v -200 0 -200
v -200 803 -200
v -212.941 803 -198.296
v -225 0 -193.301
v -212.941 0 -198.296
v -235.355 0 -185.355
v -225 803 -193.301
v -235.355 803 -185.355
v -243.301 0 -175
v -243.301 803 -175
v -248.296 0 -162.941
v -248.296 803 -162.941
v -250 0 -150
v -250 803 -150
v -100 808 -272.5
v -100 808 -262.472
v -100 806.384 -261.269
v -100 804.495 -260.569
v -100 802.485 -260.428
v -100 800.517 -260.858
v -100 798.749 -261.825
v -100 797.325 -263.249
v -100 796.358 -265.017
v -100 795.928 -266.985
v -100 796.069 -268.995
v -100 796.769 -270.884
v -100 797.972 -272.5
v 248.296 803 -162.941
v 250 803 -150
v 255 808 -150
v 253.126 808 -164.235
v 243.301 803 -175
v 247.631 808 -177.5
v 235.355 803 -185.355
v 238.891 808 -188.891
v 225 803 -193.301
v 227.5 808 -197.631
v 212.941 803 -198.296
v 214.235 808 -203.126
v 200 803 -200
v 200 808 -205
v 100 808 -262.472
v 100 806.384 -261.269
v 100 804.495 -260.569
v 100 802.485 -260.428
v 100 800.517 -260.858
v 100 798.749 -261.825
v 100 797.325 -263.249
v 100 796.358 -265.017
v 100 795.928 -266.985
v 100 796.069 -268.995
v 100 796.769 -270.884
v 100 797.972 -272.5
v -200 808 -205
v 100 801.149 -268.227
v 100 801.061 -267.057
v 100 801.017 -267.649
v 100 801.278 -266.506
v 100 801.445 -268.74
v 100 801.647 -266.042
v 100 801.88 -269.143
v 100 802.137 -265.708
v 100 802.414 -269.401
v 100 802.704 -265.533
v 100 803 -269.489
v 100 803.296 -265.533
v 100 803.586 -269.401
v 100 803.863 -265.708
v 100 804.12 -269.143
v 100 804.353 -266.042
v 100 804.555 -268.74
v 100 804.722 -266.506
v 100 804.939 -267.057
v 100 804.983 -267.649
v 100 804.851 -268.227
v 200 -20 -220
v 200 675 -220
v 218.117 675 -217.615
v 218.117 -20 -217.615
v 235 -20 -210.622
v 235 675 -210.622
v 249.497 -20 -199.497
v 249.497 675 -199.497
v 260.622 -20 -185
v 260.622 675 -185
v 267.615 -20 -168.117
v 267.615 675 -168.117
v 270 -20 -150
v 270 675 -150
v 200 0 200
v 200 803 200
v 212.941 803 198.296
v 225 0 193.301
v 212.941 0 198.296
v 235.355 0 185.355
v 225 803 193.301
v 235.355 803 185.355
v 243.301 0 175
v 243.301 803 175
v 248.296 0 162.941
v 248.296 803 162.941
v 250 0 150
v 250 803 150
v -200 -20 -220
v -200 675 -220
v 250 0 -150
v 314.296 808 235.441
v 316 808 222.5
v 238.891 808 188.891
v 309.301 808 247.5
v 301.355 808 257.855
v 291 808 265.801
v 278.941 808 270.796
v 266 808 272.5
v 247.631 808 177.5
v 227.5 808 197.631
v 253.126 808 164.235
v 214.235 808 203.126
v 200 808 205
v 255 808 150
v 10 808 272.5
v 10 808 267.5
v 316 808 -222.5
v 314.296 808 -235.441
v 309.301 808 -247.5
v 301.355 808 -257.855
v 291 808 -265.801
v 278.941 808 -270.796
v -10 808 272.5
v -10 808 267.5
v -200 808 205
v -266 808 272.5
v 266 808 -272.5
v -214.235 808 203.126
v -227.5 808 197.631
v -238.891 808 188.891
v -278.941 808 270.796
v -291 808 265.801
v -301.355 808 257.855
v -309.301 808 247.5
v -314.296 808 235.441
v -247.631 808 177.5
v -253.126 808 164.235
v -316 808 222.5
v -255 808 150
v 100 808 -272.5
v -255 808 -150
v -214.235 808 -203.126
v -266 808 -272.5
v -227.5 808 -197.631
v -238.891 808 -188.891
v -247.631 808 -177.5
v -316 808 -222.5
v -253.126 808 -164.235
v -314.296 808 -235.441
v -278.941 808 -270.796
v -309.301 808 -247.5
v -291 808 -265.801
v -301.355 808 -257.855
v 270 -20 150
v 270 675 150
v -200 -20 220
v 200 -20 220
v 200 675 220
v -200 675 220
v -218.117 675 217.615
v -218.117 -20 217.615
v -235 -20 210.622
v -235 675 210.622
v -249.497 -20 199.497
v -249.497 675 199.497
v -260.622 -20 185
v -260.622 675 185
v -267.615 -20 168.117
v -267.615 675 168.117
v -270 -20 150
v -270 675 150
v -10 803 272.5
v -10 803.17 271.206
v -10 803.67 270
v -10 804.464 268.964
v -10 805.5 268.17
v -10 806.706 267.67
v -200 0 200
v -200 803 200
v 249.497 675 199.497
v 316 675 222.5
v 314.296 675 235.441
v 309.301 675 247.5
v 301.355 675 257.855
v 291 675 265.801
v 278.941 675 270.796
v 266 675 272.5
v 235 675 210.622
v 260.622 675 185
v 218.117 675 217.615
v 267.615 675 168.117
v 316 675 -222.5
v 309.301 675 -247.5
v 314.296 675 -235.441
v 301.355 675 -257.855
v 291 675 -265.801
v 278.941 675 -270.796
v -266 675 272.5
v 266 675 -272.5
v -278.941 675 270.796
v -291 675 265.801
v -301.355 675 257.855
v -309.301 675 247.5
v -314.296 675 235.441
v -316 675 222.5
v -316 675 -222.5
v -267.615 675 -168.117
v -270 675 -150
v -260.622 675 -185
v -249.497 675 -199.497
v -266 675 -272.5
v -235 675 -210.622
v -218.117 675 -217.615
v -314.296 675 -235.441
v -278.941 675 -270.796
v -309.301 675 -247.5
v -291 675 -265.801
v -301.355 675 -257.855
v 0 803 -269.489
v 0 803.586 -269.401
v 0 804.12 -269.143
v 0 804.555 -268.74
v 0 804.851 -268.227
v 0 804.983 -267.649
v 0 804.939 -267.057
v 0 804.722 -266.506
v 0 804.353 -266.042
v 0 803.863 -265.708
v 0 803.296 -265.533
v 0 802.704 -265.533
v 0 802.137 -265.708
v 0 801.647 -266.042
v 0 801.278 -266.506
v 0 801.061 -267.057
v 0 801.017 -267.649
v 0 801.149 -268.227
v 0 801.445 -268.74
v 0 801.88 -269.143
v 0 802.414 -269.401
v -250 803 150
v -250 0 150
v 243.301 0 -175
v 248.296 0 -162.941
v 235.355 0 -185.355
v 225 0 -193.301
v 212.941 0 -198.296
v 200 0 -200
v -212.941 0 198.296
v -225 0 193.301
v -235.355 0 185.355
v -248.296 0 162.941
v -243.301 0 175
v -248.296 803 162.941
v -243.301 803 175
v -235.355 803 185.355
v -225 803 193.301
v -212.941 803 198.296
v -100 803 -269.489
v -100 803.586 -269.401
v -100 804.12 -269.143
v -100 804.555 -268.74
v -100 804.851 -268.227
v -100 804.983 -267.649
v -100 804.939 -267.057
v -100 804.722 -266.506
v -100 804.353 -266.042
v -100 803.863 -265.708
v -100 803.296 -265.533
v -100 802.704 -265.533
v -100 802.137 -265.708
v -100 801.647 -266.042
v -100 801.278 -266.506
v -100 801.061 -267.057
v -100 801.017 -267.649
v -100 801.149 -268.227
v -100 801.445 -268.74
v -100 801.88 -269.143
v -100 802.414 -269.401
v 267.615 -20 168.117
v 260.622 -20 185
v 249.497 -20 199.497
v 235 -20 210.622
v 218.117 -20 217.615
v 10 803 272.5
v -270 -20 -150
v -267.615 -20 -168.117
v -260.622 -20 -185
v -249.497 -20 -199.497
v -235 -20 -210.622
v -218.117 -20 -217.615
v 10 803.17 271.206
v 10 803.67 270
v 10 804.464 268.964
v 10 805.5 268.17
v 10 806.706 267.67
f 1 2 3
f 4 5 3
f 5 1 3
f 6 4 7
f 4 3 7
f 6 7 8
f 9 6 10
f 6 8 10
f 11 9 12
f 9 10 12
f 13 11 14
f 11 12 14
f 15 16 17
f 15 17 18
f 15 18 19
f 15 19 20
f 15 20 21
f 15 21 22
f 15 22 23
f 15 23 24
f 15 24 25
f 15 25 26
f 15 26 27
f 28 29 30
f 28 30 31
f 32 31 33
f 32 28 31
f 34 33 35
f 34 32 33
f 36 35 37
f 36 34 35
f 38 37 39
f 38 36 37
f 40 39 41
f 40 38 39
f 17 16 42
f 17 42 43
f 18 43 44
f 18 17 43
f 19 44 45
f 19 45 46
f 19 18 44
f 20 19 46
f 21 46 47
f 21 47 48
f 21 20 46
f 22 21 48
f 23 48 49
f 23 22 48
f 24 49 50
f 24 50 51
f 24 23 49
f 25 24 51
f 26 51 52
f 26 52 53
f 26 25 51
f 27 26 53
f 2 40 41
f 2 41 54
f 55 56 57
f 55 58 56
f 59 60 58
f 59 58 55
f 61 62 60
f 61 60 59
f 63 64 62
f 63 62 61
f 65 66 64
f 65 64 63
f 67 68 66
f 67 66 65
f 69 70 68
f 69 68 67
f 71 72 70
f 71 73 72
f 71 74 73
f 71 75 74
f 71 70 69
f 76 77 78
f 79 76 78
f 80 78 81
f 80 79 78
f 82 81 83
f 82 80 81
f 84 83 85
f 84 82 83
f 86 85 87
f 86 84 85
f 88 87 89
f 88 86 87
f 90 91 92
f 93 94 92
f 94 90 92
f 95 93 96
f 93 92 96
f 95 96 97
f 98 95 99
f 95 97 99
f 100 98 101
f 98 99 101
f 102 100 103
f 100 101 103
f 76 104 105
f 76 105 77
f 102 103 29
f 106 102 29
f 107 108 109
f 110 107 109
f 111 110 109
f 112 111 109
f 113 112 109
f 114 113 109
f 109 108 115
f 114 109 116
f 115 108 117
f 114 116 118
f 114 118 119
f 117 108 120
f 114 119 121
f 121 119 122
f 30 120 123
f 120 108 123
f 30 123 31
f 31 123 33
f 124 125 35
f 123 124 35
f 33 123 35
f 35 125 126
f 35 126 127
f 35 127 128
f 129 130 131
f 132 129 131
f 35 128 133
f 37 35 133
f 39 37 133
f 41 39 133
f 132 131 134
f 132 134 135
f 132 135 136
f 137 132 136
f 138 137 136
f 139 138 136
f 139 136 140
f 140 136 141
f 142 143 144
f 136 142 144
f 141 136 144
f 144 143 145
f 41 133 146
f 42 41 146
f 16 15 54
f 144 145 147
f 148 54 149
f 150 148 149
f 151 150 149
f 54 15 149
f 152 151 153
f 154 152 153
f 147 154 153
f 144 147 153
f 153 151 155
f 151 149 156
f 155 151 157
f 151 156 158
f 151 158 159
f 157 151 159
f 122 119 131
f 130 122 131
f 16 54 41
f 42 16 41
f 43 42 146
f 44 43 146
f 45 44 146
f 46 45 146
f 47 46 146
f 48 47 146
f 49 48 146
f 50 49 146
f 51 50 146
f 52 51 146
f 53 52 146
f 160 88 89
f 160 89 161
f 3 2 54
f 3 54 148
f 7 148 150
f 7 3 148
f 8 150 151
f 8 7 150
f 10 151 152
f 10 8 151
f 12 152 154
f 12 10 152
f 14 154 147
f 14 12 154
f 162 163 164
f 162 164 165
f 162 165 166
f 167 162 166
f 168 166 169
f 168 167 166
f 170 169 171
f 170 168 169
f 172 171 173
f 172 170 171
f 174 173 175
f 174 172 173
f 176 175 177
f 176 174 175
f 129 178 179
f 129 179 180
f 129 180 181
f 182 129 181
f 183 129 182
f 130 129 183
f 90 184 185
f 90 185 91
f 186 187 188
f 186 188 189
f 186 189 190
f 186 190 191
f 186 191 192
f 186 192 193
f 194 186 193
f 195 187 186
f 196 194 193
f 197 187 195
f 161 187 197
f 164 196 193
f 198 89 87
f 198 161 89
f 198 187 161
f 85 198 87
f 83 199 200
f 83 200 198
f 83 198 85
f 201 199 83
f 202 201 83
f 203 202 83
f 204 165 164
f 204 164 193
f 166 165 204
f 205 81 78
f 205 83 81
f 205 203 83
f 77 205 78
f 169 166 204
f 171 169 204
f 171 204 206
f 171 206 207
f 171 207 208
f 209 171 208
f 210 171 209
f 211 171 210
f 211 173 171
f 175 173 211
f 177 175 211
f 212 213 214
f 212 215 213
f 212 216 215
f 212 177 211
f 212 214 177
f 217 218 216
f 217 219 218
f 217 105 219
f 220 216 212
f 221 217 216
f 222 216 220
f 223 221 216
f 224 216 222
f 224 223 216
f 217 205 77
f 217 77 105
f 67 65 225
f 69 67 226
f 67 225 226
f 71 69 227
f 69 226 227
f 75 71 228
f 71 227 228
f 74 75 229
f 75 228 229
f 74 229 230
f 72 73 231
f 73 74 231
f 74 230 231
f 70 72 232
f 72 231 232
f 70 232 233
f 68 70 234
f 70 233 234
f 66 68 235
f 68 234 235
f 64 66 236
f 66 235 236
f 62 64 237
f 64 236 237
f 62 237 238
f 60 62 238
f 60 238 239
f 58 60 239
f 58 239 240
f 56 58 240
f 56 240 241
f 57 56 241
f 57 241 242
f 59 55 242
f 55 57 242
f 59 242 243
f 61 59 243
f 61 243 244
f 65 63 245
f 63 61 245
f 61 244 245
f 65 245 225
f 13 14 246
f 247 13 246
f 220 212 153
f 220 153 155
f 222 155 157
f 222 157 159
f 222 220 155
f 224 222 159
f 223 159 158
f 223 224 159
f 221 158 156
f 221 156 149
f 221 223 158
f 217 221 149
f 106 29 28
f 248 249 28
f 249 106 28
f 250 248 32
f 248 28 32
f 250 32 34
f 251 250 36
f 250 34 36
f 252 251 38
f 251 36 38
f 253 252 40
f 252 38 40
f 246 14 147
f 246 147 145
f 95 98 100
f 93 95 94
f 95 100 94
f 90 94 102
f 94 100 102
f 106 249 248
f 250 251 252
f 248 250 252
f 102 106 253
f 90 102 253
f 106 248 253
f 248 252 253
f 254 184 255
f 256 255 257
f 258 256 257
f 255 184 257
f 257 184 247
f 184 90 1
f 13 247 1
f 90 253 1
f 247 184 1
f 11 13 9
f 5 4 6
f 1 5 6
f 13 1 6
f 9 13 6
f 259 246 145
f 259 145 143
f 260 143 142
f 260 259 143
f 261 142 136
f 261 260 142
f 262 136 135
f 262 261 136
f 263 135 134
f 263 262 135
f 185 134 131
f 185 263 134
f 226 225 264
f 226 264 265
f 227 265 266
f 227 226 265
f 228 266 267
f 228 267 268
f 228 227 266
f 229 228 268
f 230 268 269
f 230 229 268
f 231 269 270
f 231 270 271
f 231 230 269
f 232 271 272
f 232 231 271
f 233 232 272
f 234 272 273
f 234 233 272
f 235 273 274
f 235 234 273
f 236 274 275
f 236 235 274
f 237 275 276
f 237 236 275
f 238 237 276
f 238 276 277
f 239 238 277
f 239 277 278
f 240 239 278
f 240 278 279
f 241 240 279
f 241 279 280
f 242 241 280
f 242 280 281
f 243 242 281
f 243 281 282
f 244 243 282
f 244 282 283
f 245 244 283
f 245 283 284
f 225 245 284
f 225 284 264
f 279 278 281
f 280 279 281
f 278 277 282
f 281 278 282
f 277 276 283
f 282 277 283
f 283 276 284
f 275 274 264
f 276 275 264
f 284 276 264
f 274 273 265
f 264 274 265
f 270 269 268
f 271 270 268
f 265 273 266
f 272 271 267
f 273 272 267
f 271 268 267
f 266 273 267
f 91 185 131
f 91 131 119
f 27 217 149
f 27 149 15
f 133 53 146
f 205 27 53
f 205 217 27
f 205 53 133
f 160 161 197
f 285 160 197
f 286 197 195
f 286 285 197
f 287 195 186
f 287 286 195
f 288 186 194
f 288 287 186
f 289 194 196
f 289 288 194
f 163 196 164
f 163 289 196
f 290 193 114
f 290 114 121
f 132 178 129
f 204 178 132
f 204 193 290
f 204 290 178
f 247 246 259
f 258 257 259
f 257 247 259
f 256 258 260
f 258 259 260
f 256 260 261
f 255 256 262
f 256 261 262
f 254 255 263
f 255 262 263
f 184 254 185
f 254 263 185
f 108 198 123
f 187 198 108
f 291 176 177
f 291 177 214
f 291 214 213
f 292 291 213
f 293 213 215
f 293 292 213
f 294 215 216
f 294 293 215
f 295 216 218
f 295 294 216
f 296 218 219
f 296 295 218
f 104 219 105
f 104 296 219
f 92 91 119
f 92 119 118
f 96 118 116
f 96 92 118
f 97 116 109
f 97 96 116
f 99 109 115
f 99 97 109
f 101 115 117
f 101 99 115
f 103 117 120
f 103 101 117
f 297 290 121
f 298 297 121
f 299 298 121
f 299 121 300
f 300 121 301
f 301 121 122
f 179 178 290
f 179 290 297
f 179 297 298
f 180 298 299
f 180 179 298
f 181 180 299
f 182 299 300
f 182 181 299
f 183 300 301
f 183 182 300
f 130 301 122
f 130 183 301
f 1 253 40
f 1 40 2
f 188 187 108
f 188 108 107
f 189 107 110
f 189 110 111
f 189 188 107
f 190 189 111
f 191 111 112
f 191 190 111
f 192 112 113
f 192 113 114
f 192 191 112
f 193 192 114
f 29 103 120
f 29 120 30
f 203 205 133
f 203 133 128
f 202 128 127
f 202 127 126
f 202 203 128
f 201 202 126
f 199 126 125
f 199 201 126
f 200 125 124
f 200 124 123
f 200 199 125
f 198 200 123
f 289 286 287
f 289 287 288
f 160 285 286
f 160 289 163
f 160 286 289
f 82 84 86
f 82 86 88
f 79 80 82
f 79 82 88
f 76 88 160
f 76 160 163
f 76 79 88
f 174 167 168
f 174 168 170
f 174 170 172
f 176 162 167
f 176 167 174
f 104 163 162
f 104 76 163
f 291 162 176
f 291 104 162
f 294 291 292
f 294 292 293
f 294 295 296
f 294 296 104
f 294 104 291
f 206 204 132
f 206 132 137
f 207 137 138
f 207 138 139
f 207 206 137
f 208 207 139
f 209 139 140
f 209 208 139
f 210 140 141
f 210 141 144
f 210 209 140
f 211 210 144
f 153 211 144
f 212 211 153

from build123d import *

# Parameters (mm, degrees)
BOSS_EXTRUDE1_DEPTH             = 800
SHELL1_T                        = 20
FILLET1_R                       = 10
SKETCH2_W                       = 30
SKETCH2_H                       = 40.435969651
SKETCH2_W_2                     = 30.005971622
BOSS_EXTRUDE2_DEPTH             = 50
SKETCH3_R                       = 10
CUT_EXTRUDE1_DEPTH              = 91
SKETCH4_W                       = 55.917258457
SKETCH4_H                       = 29.702669957
BOSS_EXTRUDE3_DEPTH             = 46
SKETCH5_R                       = 7.963396182
SKETCH5_R_2                     = 2.238128569
BOSS_EXTRUDE4_DEPTH             = 105
CHAMFER1_SIZE                   = 5
BOSS_EXTRUDE5_DEPTH             = 8
BOSS_EXTRUDE5_DEPTH_BACK        = 125
CUT_EXTRUDE5_REACH              = 929.198
CUT_EXTRUDE8_DEPTH              = 100
CUT_EXTRUDE8_DEPTH_BACK         = 100
SKETCH13_R                      = 7.090708657
BOSS_EXTRUDE6_REACH             = 911.382
SKETCH15_R                      = 1.988865479
BOSS_EXTRUDE6_DIRECTION_2_REACH = 911.382
CUT_EXTRUDE9_DEPTH              = 10
CUT_EXTRUDE9_DEPTH_BACK         = 10
SKETCH16_R                      = 5
CHAMFER2_SIZE                   = 5


with BuildPart() as part:
    # Sketch1 → Boss-Extrude1 (new body)
    with BuildSketch(Plane(origin=(0, 0, 0), x_dir=(1, 0, 0), z_dir=(0, 1, 0))):
        with BuildLine():
            Line((-200, 200), (200, 200))
            ThreePointArc((200, 200), (235.355339059, 185.355339059), (250, 150))
            Line((250, 150), (250, -150))
            ThreePointArc((250, -150), (235.355339059, -185.355339059), (200, -200))
            Line((200, -200), (-200, -200))
            ThreePointArc((-200, -200), (-235.355339059, -185.355339059), (-250, -150))
            Line((-250, -150), (-250, 150))
            ThreePointArc((-250, 150), (-235.355339059, 185.355339059), (-200, 200))
        make_face()
    extrude(amount=BOSS_EXTRUDE1_DEPTH)

    # Shell1
    shell1_openings = [part.faces().sort_by_distance(p)[0] for p in [
        (0, 800, 0),
    ]]
    offset(amount=SHELL1_T, openings=shell1_openings, kind=Kind.INTERSECTION)

    # Fillet1
    # the kernel refuses this fillet: 10 mm, written as the material it takes off along each edge
    with BuildSketch(Plane(origin=(-200, 800, 150), x_dir=(0, 0, 1), z_dir=(1, 0, 0))) as fillet1_piece_1:
        with BuildLine():
            CenterArc((50 + FILLET1_R, FILLET1_R), FILLET1_R, 180, 90)
            Line((50 + FILLET1_R, 0), (50, 0))
            Line((50, 0), (50, FILLET1_R))
        make_face()
    revolve(axis=Axis((-200, 800, 150), (0, -1, 0)), revolution_arc=90, mode=Mode.SUBTRACT)
    with BuildSketch(Plane(origin=(200, 800, 200), x_dir=(0, -1, 0), z_dir=(-1, 0, 0)), Plane(origin=(-200, 800, -200), x_dir=(0, -1, 0), z_dir=(1, 0, 0))) as fillet1_piece_2:
        with BuildLine():
            CenterArc((FILLET1_R, FILLET1_R), FILLET1_R, 180, 90)
            Line((0, FILLET1_R), (0, 0))
            Line((0, 0), (FILLET1_R, 0))
        make_face()
    extrude(amount=400, mode=Mode.SUBTRACT)
    with BuildSketch(Plane(origin=(200, 800, 150), x_dir=(1, 0, 0), z_dir=(0, 0, -1))) as fillet1_piece_3:
        with BuildLine():
            CenterArc((50 + FILLET1_R, FILLET1_R), FILLET1_R, 180, 90)
            Line((50 + FILLET1_R, 0), (50, 0))
            Line((50, 0), (50, FILLET1_R))
        make_face()
    revolve(axis=Axis((200, 800, 150), (0, -1, 0)), revolution_arc=90, mode=Mode.SUBTRACT)
    with BuildSketch(Plane(origin=(250, 800, -150), x_dir=(0, -1, 0), z_dir=(0, 0, 1)), Plane(origin=(-250, 800, 150), x_dir=(0, -1, 0), z_dir=(0, 0, -1))) as fillet1_piece_4:
        with BuildLine():
            CenterArc((FILLET1_R, FILLET1_R), FILLET1_R, 180, 90)
            Line((0, FILLET1_R), (0, 0))
            Line((0, 0), (FILLET1_R, 0))
        make_face()
    extrude(amount=300, mode=Mode.SUBTRACT)
    with BuildSketch(Plane(origin=(200, 800, -150), x_dir=(0, 0, -1), z_dir=(-1, 0, 0))) as fillet1_piece_5:
        with BuildLine():
            CenterArc((50 + FILLET1_R, FILLET1_R), FILLET1_R, 180, 90)
            Line((50 + FILLET1_R, 0), (50, 0))
            Line((50, 0), (50, FILLET1_R))
        make_face()
    revolve(axis=Axis((200, 800, -150), (0, -1, 0)), revolution_arc=90, mode=Mode.SUBTRACT)
    with BuildSketch(Plane(origin=(-200, 800, -150), x_dir=(-1, 0, 0), z_dir=(0, 0, 1))) as fillet1_piece_6:
        with BuildLine():
            CenterArc((50 + FILLET1_R, FILLET1_R), FILLET1_R, 180, 90)
            Line((50 + FILLET1_R, 0), (50, 0))
            Line((50, 0), (50, FILLET1_R))
        make_face()
    revolve(axis=Axis((-200, 800, -150), (0, -1, 0)), revolution_arc=90, mode=Mode.SUBTRACT)

    # Sketch2 → Boss-Extrude2 (add)
    with BuildSketch(Plane(origin=(0, 0, -220), x_dir=(-1, 0, 0), z_dir=(0, 0, -1))):
        with Locations((-30.002985811, 779.782015174)):
            Rectangle(SKETCH2_W, SKETCH2_H)
        with Locations((30, 779.782015174)):
            Rectangle(SKETCH2_W_2, SKETCH2_H)
    extrude(amount=BOSS_EXTRUDE2_DEPTH)

    # Sketch3 → Cut-Extrude1 (cut)
    with BuildSketch(Plane(origin=(45.002985811, 0, 0), x_dir=(0, 0, -1), z_dir=(1, 0, 0))):
        with Locations((245, 779.782015175)):
            Circle(SKETCH3_R)
        with BuildLine():
            Line((245, 800), (270, 800))
            Line((270, 800), (270, 759.564030349))
            Line((270, 759.564030349), (245, 759.564030349))
            ThreePointArc((245, 759.564030349), (265.217984825, 779.782015175), (245, 800))
        make_face()
    extrude(amount=-CUT_EXTRUDE1_DEPTH, mode=Mode.SUBTRACT)

    # Sketch4 → Boss-Extrude3 (add)
    with BuildSketch(Plane(origin=(0, 0, -220), x_dir=(-1, 0, 0), z_dir=(0, 0, -1))):
        with Locations((-87.655186212, 779.782015174)):
            Rectangle(SKETCH4_W, SKETCH4_H)
    extrude(amount=BOSS_EXTRUDE3_DEPTH)

    # Sketch5 → Boss-Extrude4 (add)
    with BuildSketch(Plane.ZY.offset(-59.696556983)):
        with Locations(Location((-245, 779.782015175, 0), (0, 0, 180))):
            Circle(SKETCH5_R)
        with Locations((-245, 779.782015175)):
            Circle(SKETCH5_R_2, mode=Mode.SUBTRACT)
    extrude(amount=BOSS_EXTRUDE4_DEPTH)

    # Chamfer1
    chamfer1_edges = [part.edges().sort_by_distance(p)[0] for p in [
        (87.655186211, 794.633350153, -266),
        (87.655186211, 764.930680196, -266),
    ]]
    chamfer(chamfer1_edges, length=CHAMFER1_SIZE)

    # Sketch8 → Boss-Extrude5 (add, two sides: drawn at the far end of the back side and taken through both)
    with BuildSketch(Plane(origin=(0, 800, 0), x_dir=(1, 0, 0), z_dir=(0, 1, 0)).offset(-BOSS_EXTRUDE5_DEPTH_BACK)):
        with BuildLine():
            Line((-266, 272.5), (266, 272.5))
            ThreePointArc((266, 272.5), (301.355339059, 257.855339059), (316, 222.5))
            Line((316, 222.5), (316, -222.5))
            ThreePointArc((316, -222.5), (301.355339059, -257.855339059), (266, -272.5))
            Line((266, -272.5), (-266, -272.5))
            ThreePointArc((-266, -272.5), (-301.355339059, -257.855339059), (-316, -222.5))
            Line((-316, -222.5), (-316, 222.5))
            ThreePointArc((-316, 222.5), (-301.355339059, 257.855339059), (-266, 272.5))
        make_face()
    extrude(amount=BOSS_EXTRUDE5_DEPTH + BOSS_EXTRUDE5_DEPTH_BACK)

    # Sketch11 → Cut-Extrude5 (cut, up to next)
    with BuildSketch(Plane(origin=(0, 808, 0), x_dir=(1, 0, 0), z_dir=(0, 1, 0)), mode=Mode.PRIVATE) as cut_extrude5_sk1:
        with BuildLine():
            Line((-200, -200), (200, -200))
            ThreePointArc((200, -200), (235.355339059, -185.355339059), (250, -150))
            Line((250, -150), (250, 150))
            ThreePointArc((250, 150), (235.355339059, 185.355339059), (200, 200))
            Line((200, 200), (-200, 200))
            ThreePointArc((-200, 200), (-235.355339059, 185.355339059), (-250, 150))
            Line((-250, 150), (-250, -150))
            ThreePointArc((-250, -150), (-235.355339059, -185.355339059), (-200, -200))
        make_face()
    cut_extrude5_tool1 = extrude(cut_extrude5_sk1.sketch, amount=-CUT_EXTRUDE5_REACH, mode=Mode.PRIVATE) & part.part
    add(cut_extrude5_tool1.solids().sort_by_distance((0, 808, 0))[0], mode=Mode.SUBTRACT)

    # Sketch13 → Cut-Extrude8 (cut, two sides: drawn at the far end of the back side and taken through both)
    with BuildSketch(Plane(origin=(0, 0, 0), x_dir=(0, 0, -1), z_dir=(1, 0, 0)).offset(-CUT_EXTRUDE8_DEPTH_BACK)):
        with Locations((267.5, 803)):
            Circle(SKETCH13_R)
    extrude(amount=CUT_EXTRUDE8_DEPTH + CUT_EXTRUDE8_DEPTH_BACK, mode=Mode.SUBTRACT)


with BuildPart() as body_2:

    # Sketch15 → Boss-Extrude6 (new, up to next)
    with BuildSketch(Plane(origin=(0, 0, 0), x_dir=(0, 0, -1), z_dir=(1, 0, 0)), mode=Mode.PRIVATE) as boss_extrude6_sk1:
        with Locations((267.5, 803)):
            Circle(SKETCH15_R)
    boss_extrude6_tool1 = extrude(boss_extrude6_sk1.sketch, amount=BOSS_EXTRUDE6_REACH, mode=Mode.PRIVATE) - part.part
    add(boss_extrude6_tool1.solids().sort_by_distance((0, 803, -267.5))[0])


    # Sketch15 → Boss-Extrude6 direction 2 (add, up to next)
    with BuildSketch(Plane(origin=(0, 0, 0), x_dir=(0, 0, -1), z_dir=(1, 0, 0)), mode=Mode.PRIVATE) as boss_extrude6_direction_2_sk1:
        with Locations((267.5, 803)):
            Circle(SKETCH15_R)
    boss_extrude6_direction_2_tool1 = extrude(boss_extrude6_direction_2_sk1.sketch, amount=-BOSS_EXTRUDE6_DIRECTION_2_REACH, mode=Mode.PRIVATE) - part.part
    add(boss_extrude6_direction_2_tool1.solids().sort_by_distance((0, 803, -267.5))[0])


with BuildPart() as part_1:
    add(part.part)

    # Sketch16 → Cut-Extrude9 (cut, two sides: drawn at the far end of the back side and taken through both)
    with BuildSketch(Plane(origin=(0, 0, 0), x_dir=(0, 0, -1), z_dir=(1, 0, 0)).offset(-CUT_EXTRUDE9_DEPTH_BACK)):
        with Locations((-272.5, 808)):
            Circle(SKETCH16_R)
    extrude(amount=CUT_EXTRUDE9_DEPTH + CUT_EXTRUDE9_DEPTH_BACK, mode=Mode.SUBTRACT)

    # Chamfer2
    chamfer2_edges = [part_1.edges().sort_by_distance(p)[0] for p in [
        (-235.355339059, 808, -185.355339059),
        (-250, 808, 0),
        (-235.355339059, 808, 185.355339059),
        (0, 808, 200),
        (235.355339059, 808, 185.355339059),
        (250, 808, 0),
        (235.355339059, 808, -185.355339059),
        (0, 808, -200),
    ]]
    chamfer(chamfer2_edges, length=CHAMFER2_SIZE)


solid = Compound([body_2.part, part_1.part])
